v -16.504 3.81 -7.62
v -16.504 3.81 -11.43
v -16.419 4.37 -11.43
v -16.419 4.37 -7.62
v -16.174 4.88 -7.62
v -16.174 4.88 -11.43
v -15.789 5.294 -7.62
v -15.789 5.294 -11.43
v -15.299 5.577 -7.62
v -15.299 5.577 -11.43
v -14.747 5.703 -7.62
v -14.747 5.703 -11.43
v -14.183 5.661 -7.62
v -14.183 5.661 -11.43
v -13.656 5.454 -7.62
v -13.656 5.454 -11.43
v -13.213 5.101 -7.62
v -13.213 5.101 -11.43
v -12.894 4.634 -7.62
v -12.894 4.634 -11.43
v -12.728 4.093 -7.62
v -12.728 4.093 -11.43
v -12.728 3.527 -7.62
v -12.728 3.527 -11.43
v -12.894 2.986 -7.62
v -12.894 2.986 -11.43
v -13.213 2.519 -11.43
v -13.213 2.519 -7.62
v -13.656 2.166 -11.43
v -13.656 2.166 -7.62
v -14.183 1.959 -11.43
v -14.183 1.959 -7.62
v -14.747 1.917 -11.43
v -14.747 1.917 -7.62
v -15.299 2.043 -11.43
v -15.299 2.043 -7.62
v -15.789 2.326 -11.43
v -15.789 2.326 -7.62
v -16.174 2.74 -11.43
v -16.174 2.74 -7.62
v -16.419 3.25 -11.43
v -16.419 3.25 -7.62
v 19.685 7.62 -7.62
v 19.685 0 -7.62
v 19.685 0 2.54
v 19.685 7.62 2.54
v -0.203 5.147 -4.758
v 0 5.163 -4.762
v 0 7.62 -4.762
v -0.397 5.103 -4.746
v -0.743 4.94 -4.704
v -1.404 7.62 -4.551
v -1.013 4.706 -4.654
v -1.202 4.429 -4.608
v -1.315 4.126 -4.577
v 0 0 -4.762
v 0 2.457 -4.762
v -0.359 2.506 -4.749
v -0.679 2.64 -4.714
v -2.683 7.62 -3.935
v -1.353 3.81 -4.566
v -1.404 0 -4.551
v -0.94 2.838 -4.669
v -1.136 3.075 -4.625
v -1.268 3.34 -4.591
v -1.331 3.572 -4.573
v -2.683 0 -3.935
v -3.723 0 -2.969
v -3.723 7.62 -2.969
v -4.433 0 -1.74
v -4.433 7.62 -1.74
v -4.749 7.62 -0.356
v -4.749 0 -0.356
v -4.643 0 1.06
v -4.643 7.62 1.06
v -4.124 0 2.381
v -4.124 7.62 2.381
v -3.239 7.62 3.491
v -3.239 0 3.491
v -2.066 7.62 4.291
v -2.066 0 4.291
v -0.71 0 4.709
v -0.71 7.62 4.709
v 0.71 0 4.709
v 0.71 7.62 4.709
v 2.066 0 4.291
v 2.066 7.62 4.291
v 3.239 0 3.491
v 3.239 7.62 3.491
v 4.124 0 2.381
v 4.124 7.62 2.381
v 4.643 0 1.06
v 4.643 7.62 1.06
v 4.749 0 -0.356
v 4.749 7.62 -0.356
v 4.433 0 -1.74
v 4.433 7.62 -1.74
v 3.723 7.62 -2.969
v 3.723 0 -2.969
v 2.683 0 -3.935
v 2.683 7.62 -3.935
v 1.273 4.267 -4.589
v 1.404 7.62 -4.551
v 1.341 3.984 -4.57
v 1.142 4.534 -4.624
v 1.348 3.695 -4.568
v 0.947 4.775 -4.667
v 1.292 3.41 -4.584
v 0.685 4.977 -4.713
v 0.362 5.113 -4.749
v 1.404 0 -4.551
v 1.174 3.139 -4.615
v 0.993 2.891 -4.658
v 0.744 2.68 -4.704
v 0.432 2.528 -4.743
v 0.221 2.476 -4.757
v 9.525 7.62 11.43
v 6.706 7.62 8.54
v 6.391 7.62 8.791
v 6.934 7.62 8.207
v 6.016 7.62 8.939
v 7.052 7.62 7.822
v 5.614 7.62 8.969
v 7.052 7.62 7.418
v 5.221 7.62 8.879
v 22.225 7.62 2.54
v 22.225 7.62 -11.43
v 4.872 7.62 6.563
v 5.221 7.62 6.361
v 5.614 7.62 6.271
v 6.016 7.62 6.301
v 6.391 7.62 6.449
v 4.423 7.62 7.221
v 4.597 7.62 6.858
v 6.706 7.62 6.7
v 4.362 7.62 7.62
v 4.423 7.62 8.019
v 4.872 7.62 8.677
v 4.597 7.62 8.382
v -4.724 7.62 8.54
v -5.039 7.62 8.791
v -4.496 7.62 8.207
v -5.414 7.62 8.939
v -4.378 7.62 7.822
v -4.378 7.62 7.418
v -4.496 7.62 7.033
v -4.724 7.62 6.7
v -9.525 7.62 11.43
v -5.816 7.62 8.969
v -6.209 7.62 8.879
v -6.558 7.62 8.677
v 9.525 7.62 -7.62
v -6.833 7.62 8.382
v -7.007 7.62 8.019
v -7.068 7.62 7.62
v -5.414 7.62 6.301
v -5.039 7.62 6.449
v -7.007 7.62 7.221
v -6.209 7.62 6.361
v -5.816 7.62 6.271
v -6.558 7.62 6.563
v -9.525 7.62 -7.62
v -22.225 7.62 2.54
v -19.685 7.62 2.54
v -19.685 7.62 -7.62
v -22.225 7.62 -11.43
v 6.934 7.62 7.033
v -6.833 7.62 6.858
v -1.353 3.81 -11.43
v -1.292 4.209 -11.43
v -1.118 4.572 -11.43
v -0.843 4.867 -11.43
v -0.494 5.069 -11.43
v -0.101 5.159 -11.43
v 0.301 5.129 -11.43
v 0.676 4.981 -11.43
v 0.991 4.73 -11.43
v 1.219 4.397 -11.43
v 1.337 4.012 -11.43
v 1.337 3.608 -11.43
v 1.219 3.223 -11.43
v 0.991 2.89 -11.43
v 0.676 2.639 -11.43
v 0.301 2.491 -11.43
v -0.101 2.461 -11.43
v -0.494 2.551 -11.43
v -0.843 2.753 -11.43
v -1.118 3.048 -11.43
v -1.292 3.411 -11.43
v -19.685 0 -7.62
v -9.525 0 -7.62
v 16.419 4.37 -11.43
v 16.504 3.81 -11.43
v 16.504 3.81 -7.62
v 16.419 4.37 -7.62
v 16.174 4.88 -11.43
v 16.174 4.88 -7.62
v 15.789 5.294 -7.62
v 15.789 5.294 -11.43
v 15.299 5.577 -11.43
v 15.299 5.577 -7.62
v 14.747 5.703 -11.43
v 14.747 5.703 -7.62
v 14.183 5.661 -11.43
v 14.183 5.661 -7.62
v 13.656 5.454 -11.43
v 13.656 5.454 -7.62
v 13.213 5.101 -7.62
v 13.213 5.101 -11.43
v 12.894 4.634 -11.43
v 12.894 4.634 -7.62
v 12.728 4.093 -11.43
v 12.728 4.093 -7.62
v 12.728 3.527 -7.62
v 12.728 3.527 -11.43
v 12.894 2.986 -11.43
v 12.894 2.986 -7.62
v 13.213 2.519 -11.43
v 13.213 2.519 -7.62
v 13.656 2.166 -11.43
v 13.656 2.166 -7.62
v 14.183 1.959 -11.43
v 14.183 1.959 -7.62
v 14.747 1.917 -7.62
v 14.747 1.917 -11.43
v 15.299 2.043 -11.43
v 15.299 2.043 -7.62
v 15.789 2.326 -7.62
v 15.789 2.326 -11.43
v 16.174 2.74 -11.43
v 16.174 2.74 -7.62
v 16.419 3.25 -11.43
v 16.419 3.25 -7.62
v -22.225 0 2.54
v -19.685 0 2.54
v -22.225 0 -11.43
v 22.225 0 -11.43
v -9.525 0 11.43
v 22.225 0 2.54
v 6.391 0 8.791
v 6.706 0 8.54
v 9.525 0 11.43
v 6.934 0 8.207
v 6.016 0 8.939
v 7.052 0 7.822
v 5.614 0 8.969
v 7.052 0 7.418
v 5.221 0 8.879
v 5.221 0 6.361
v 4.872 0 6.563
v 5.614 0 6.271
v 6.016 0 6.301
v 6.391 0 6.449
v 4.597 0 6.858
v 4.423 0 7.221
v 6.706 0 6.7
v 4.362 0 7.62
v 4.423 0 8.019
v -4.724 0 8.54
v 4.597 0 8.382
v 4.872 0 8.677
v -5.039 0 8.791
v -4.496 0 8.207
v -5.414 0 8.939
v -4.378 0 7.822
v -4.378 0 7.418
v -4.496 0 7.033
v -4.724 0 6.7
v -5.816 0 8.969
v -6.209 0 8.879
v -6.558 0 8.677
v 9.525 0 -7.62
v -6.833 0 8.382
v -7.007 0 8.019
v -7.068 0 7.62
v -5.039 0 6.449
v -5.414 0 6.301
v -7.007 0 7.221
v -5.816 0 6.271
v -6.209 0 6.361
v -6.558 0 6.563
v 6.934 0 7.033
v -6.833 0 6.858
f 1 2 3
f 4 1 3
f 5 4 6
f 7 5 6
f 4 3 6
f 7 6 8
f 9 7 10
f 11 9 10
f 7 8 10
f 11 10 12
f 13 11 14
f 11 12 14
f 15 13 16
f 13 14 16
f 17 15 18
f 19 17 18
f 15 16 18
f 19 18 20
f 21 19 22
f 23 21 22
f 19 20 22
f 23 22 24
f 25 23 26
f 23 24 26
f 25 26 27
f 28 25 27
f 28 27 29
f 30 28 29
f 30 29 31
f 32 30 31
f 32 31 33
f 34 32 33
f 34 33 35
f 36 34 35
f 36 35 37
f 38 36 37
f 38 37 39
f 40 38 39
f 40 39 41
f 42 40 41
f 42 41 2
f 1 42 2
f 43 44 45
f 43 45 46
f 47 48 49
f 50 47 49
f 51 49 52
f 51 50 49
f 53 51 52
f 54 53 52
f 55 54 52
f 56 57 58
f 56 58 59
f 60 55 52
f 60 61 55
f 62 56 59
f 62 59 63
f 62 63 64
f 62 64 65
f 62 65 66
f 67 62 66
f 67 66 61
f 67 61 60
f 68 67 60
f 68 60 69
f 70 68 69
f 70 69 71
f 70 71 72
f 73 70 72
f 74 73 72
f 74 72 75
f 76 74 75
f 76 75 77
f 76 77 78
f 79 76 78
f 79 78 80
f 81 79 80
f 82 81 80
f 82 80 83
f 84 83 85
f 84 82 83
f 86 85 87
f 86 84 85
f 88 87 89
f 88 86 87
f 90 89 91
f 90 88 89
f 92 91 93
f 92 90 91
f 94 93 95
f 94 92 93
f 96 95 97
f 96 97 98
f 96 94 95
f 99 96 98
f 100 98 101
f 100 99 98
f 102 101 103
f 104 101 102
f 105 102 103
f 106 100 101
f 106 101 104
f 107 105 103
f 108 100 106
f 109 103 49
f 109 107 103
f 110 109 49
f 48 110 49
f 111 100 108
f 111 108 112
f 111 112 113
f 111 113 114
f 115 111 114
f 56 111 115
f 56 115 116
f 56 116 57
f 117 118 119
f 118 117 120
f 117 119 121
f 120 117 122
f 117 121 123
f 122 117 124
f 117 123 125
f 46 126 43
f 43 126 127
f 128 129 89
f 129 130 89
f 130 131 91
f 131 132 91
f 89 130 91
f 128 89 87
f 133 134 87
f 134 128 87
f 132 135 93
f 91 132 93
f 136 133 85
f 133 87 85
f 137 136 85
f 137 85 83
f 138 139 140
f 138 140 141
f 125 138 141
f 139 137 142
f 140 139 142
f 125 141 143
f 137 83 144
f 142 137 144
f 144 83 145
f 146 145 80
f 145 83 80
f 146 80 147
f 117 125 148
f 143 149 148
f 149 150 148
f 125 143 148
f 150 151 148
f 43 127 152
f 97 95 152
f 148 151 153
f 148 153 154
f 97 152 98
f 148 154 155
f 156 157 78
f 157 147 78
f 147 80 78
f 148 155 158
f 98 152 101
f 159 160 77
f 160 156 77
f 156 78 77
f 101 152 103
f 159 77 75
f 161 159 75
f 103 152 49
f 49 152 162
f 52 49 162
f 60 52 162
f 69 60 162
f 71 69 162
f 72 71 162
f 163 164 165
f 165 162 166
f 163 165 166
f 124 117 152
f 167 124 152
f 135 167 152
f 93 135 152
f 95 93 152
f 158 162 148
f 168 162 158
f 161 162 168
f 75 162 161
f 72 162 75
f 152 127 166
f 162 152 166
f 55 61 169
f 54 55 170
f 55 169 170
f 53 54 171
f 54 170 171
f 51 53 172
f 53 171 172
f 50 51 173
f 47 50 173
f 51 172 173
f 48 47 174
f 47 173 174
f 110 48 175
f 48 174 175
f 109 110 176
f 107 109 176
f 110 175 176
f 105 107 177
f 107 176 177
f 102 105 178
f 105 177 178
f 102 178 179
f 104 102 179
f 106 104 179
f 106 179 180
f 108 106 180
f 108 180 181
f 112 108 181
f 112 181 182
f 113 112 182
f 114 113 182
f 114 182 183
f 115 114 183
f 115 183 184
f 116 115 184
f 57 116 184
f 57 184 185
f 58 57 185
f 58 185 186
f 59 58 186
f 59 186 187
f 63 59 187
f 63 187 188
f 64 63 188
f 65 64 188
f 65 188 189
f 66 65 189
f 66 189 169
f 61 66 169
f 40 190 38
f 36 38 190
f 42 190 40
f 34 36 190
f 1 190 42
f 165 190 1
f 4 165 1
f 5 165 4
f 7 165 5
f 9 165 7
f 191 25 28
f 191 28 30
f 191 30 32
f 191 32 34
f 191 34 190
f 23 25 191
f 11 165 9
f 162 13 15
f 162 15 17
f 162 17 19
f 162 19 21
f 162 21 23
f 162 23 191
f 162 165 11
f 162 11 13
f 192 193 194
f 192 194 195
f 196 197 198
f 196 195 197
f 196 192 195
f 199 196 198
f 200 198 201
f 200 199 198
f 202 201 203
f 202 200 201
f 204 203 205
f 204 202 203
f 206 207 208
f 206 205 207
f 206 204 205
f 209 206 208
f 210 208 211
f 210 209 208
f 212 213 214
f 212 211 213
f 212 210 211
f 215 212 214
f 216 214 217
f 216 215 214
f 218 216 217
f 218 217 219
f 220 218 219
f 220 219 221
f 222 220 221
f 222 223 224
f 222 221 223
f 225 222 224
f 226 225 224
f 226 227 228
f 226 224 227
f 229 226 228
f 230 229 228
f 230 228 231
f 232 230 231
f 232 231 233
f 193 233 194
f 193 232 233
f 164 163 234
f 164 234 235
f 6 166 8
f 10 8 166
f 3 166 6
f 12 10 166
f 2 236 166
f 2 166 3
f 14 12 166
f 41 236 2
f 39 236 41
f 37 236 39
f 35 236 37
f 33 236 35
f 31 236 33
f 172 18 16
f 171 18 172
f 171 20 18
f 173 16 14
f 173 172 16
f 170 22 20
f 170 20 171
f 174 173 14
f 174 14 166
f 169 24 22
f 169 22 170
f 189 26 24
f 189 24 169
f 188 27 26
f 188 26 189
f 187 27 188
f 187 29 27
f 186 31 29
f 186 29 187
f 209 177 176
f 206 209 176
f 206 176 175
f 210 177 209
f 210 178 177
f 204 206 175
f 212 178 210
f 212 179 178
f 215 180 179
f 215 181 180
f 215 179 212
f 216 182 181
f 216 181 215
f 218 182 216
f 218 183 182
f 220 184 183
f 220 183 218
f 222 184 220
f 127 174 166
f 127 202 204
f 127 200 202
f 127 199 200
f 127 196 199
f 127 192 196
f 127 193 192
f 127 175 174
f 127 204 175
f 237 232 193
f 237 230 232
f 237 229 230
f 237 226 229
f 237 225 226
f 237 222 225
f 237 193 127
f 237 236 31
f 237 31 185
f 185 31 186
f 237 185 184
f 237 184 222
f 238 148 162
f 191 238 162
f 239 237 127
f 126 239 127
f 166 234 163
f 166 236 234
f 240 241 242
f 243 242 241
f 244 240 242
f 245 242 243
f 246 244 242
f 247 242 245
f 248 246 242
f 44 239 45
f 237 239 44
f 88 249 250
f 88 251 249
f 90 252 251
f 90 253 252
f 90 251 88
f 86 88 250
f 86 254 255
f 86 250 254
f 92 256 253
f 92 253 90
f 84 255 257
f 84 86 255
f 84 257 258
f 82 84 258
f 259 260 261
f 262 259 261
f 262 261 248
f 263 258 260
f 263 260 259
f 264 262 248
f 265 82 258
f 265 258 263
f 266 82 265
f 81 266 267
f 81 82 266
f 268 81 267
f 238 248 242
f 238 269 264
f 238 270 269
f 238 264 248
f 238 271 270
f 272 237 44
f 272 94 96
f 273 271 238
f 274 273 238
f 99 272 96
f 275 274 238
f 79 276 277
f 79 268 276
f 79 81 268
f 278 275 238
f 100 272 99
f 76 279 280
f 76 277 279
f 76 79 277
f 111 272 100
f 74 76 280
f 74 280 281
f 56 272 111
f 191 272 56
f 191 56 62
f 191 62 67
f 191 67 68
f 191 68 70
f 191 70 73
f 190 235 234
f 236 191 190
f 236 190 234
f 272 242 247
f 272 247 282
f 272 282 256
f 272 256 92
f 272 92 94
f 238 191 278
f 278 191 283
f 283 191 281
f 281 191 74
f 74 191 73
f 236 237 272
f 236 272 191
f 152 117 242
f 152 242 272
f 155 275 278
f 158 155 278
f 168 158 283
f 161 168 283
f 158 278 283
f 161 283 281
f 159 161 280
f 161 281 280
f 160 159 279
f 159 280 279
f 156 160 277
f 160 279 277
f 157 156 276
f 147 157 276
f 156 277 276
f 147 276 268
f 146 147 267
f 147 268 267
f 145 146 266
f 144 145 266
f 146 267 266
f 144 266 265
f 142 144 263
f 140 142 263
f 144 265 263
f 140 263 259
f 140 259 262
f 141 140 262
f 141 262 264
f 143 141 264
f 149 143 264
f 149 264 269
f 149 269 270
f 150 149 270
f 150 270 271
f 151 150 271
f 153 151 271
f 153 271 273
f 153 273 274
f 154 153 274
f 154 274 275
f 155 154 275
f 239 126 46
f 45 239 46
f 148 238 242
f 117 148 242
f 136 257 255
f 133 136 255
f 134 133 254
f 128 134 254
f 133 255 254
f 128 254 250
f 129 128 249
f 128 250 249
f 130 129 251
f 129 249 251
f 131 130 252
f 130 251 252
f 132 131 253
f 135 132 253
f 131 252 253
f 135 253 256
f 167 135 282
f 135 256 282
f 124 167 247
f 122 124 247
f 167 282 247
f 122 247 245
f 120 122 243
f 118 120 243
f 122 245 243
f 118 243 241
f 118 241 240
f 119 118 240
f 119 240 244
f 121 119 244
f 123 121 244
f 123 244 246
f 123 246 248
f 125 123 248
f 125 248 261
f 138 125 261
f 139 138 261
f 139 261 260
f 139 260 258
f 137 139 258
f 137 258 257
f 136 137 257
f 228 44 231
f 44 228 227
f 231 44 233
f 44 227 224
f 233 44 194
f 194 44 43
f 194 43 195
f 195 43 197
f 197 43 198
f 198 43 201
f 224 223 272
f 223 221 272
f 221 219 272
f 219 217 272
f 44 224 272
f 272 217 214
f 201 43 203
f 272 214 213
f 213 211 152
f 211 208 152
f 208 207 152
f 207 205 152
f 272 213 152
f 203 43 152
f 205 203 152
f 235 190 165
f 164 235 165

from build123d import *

# Parameters (mm, degrees)
SKETCH1_W                  = 44.45
SKETCH1_H                  = 22.86
SKETCH1_R                  = 4.7625
BOSS_EXTRUDE1_DEPTH        = 7.62
F_6_32_TAPPED_HOLE1_REACH  = 34.781
F_6_32_TAPPED_HOLE1_BORE_R = 1.35255
CUT_EXTRUDE2_REACH         = 28.128
SKETCH19_W                 = 12.7
SKETCH19_H                 = 19.05
F_6_CLEARANCE_HOLE1_D      = 3.7973
SKETCH24_W                 = 2.54
SKETCH24_H                 = 7.62
BOSS_EXTRUDE2_DEPTH        = 10.16
F_6_32_TAPPED_HOLE5_D      = 2.7051


with BuildPart() as part:
    # Sketch1 → Boss-Extrude1 (new body)
    with BuildSketch(Plane(origin=(0, 0, 0), x_dir=(1, 0, 0), z_dir=(0, 1, 0))):
        Rectangle(SKETCH1_W, SKETCH1_H)
        with Locations(Location((0, 0, 0), (0, 0, 90))):
            Circle(SKETCH1_R, mode=Mode.SUBTRACT)
    extrude(amount=BOSS_EXTRUDE1_DEPTH)

    # #6-32 Tapped Hole1 bore → #6-32 Tapped Hole1 (cut, up to next)
    with BuildSketch(Plane(origin=(0, 0, -11.43), x_dir=(-1, 0, 0), z_dir=(0, 0, -1)), mode=Mode.PRIVATE) as f_6_32_tapped_hole1_sk1:
        with Locations((0, 3.81)):
            Circle(F_6_32_TAPPED_HOLE1_BORE_R)
    f_6_32_tapped_hole1_tool1 = extrude(f_6_32_tapped_hole1_sk1.sketch, amount=-F_6_32_TAPPED_HOLE1_REACH, mode=Mode.PRIVATE) & part.part
    add(f_6_32_tapped_hole1_tool1.solids().sort_by_distance((0, 3.81, -11.43))[0], mode=Mode.SUBTRACT)

    # Sketch19 → Cut-Extrude2 (cut, up to next)
    with BuildSketch(Plane(origin=(0, 7.62, 0), x_dir=(1, 0, 0), z_dir=(0, 1, 0)), mode=Mode.PRIVATE) as cut_extrude2_sk1:
        with Locations((-15.875, -1.905)):
            Rectangle(SKETCH19_W, SKETCH19_H)
    cut_extrude2_tool1 = extrude(cut_extrude2_sk1.sketch, amount=-CUT_EXTRUDE2_REACH, mode=Mode.PRIVATE) & part.part
    cut_extrude2 = cut_extrude2_tool1.solids().sort_by_distance((-15.875, 7.62, 1.905))[0]
    add(cut_extrude2, mode=Mode.SUBTRACT)

    # #6 Clearance Hole1 (through all)
    with Locations(Plane.XY.offset(-7.62)):
        with Locations((-14.605, 3.81)):
            f_6_clearance_hole1 = Hole(F_6_CLEARANCE_HOLE1_D / 2)

    # Mirror4: Cut-Extrude2, #6 Clearance Hole1 across plane
    add(cut_extrude2.mirror(Plane(origin=(0, 0, 0), x_dir=(0, 0, 1), z_dir=(1, 0, 0))), mode=Mode.SUBTRACT)
    add(f_6_clearance_hole1.mirror(Plane(origin=(0, 0, 0), x_dir=(0, 0, 1), z_dir=(1, 0, 0))), mode=Mode.SUBTRACT)

    # Sketch24 → Boss-Extrude2 (add)
    with BuildSketch(Plane.XY.offset(-7.62)):
        with Locations((-20.955, 3.81)):
            Rectangle(SKETCH24_W, SKETCH24_H)
    boss_extrude2 = extrude(amount=BOSS_EXTRUDE2_DEPTH)

    # Mirror5: Boss-Extrude2 across plane
    add(boss_extrude2.mirror(Plane(origin=(0, 0, 0), x_dir=(0, 0, 1), z_dir=(1, 0, 0))))

    # #6-32 Tapped Hole5 (through all)
    with Locations(Plane(origin=(0, 7.62, 0), x_dir=(1, 0, 0), z_dir=(0, 1, 0))):
        with Locations((-5.715, -7.62), (5.715, -7.62)):
            Hole(F_6_32_TAPPED_HOLE5_D / 2)


solid = part.part
